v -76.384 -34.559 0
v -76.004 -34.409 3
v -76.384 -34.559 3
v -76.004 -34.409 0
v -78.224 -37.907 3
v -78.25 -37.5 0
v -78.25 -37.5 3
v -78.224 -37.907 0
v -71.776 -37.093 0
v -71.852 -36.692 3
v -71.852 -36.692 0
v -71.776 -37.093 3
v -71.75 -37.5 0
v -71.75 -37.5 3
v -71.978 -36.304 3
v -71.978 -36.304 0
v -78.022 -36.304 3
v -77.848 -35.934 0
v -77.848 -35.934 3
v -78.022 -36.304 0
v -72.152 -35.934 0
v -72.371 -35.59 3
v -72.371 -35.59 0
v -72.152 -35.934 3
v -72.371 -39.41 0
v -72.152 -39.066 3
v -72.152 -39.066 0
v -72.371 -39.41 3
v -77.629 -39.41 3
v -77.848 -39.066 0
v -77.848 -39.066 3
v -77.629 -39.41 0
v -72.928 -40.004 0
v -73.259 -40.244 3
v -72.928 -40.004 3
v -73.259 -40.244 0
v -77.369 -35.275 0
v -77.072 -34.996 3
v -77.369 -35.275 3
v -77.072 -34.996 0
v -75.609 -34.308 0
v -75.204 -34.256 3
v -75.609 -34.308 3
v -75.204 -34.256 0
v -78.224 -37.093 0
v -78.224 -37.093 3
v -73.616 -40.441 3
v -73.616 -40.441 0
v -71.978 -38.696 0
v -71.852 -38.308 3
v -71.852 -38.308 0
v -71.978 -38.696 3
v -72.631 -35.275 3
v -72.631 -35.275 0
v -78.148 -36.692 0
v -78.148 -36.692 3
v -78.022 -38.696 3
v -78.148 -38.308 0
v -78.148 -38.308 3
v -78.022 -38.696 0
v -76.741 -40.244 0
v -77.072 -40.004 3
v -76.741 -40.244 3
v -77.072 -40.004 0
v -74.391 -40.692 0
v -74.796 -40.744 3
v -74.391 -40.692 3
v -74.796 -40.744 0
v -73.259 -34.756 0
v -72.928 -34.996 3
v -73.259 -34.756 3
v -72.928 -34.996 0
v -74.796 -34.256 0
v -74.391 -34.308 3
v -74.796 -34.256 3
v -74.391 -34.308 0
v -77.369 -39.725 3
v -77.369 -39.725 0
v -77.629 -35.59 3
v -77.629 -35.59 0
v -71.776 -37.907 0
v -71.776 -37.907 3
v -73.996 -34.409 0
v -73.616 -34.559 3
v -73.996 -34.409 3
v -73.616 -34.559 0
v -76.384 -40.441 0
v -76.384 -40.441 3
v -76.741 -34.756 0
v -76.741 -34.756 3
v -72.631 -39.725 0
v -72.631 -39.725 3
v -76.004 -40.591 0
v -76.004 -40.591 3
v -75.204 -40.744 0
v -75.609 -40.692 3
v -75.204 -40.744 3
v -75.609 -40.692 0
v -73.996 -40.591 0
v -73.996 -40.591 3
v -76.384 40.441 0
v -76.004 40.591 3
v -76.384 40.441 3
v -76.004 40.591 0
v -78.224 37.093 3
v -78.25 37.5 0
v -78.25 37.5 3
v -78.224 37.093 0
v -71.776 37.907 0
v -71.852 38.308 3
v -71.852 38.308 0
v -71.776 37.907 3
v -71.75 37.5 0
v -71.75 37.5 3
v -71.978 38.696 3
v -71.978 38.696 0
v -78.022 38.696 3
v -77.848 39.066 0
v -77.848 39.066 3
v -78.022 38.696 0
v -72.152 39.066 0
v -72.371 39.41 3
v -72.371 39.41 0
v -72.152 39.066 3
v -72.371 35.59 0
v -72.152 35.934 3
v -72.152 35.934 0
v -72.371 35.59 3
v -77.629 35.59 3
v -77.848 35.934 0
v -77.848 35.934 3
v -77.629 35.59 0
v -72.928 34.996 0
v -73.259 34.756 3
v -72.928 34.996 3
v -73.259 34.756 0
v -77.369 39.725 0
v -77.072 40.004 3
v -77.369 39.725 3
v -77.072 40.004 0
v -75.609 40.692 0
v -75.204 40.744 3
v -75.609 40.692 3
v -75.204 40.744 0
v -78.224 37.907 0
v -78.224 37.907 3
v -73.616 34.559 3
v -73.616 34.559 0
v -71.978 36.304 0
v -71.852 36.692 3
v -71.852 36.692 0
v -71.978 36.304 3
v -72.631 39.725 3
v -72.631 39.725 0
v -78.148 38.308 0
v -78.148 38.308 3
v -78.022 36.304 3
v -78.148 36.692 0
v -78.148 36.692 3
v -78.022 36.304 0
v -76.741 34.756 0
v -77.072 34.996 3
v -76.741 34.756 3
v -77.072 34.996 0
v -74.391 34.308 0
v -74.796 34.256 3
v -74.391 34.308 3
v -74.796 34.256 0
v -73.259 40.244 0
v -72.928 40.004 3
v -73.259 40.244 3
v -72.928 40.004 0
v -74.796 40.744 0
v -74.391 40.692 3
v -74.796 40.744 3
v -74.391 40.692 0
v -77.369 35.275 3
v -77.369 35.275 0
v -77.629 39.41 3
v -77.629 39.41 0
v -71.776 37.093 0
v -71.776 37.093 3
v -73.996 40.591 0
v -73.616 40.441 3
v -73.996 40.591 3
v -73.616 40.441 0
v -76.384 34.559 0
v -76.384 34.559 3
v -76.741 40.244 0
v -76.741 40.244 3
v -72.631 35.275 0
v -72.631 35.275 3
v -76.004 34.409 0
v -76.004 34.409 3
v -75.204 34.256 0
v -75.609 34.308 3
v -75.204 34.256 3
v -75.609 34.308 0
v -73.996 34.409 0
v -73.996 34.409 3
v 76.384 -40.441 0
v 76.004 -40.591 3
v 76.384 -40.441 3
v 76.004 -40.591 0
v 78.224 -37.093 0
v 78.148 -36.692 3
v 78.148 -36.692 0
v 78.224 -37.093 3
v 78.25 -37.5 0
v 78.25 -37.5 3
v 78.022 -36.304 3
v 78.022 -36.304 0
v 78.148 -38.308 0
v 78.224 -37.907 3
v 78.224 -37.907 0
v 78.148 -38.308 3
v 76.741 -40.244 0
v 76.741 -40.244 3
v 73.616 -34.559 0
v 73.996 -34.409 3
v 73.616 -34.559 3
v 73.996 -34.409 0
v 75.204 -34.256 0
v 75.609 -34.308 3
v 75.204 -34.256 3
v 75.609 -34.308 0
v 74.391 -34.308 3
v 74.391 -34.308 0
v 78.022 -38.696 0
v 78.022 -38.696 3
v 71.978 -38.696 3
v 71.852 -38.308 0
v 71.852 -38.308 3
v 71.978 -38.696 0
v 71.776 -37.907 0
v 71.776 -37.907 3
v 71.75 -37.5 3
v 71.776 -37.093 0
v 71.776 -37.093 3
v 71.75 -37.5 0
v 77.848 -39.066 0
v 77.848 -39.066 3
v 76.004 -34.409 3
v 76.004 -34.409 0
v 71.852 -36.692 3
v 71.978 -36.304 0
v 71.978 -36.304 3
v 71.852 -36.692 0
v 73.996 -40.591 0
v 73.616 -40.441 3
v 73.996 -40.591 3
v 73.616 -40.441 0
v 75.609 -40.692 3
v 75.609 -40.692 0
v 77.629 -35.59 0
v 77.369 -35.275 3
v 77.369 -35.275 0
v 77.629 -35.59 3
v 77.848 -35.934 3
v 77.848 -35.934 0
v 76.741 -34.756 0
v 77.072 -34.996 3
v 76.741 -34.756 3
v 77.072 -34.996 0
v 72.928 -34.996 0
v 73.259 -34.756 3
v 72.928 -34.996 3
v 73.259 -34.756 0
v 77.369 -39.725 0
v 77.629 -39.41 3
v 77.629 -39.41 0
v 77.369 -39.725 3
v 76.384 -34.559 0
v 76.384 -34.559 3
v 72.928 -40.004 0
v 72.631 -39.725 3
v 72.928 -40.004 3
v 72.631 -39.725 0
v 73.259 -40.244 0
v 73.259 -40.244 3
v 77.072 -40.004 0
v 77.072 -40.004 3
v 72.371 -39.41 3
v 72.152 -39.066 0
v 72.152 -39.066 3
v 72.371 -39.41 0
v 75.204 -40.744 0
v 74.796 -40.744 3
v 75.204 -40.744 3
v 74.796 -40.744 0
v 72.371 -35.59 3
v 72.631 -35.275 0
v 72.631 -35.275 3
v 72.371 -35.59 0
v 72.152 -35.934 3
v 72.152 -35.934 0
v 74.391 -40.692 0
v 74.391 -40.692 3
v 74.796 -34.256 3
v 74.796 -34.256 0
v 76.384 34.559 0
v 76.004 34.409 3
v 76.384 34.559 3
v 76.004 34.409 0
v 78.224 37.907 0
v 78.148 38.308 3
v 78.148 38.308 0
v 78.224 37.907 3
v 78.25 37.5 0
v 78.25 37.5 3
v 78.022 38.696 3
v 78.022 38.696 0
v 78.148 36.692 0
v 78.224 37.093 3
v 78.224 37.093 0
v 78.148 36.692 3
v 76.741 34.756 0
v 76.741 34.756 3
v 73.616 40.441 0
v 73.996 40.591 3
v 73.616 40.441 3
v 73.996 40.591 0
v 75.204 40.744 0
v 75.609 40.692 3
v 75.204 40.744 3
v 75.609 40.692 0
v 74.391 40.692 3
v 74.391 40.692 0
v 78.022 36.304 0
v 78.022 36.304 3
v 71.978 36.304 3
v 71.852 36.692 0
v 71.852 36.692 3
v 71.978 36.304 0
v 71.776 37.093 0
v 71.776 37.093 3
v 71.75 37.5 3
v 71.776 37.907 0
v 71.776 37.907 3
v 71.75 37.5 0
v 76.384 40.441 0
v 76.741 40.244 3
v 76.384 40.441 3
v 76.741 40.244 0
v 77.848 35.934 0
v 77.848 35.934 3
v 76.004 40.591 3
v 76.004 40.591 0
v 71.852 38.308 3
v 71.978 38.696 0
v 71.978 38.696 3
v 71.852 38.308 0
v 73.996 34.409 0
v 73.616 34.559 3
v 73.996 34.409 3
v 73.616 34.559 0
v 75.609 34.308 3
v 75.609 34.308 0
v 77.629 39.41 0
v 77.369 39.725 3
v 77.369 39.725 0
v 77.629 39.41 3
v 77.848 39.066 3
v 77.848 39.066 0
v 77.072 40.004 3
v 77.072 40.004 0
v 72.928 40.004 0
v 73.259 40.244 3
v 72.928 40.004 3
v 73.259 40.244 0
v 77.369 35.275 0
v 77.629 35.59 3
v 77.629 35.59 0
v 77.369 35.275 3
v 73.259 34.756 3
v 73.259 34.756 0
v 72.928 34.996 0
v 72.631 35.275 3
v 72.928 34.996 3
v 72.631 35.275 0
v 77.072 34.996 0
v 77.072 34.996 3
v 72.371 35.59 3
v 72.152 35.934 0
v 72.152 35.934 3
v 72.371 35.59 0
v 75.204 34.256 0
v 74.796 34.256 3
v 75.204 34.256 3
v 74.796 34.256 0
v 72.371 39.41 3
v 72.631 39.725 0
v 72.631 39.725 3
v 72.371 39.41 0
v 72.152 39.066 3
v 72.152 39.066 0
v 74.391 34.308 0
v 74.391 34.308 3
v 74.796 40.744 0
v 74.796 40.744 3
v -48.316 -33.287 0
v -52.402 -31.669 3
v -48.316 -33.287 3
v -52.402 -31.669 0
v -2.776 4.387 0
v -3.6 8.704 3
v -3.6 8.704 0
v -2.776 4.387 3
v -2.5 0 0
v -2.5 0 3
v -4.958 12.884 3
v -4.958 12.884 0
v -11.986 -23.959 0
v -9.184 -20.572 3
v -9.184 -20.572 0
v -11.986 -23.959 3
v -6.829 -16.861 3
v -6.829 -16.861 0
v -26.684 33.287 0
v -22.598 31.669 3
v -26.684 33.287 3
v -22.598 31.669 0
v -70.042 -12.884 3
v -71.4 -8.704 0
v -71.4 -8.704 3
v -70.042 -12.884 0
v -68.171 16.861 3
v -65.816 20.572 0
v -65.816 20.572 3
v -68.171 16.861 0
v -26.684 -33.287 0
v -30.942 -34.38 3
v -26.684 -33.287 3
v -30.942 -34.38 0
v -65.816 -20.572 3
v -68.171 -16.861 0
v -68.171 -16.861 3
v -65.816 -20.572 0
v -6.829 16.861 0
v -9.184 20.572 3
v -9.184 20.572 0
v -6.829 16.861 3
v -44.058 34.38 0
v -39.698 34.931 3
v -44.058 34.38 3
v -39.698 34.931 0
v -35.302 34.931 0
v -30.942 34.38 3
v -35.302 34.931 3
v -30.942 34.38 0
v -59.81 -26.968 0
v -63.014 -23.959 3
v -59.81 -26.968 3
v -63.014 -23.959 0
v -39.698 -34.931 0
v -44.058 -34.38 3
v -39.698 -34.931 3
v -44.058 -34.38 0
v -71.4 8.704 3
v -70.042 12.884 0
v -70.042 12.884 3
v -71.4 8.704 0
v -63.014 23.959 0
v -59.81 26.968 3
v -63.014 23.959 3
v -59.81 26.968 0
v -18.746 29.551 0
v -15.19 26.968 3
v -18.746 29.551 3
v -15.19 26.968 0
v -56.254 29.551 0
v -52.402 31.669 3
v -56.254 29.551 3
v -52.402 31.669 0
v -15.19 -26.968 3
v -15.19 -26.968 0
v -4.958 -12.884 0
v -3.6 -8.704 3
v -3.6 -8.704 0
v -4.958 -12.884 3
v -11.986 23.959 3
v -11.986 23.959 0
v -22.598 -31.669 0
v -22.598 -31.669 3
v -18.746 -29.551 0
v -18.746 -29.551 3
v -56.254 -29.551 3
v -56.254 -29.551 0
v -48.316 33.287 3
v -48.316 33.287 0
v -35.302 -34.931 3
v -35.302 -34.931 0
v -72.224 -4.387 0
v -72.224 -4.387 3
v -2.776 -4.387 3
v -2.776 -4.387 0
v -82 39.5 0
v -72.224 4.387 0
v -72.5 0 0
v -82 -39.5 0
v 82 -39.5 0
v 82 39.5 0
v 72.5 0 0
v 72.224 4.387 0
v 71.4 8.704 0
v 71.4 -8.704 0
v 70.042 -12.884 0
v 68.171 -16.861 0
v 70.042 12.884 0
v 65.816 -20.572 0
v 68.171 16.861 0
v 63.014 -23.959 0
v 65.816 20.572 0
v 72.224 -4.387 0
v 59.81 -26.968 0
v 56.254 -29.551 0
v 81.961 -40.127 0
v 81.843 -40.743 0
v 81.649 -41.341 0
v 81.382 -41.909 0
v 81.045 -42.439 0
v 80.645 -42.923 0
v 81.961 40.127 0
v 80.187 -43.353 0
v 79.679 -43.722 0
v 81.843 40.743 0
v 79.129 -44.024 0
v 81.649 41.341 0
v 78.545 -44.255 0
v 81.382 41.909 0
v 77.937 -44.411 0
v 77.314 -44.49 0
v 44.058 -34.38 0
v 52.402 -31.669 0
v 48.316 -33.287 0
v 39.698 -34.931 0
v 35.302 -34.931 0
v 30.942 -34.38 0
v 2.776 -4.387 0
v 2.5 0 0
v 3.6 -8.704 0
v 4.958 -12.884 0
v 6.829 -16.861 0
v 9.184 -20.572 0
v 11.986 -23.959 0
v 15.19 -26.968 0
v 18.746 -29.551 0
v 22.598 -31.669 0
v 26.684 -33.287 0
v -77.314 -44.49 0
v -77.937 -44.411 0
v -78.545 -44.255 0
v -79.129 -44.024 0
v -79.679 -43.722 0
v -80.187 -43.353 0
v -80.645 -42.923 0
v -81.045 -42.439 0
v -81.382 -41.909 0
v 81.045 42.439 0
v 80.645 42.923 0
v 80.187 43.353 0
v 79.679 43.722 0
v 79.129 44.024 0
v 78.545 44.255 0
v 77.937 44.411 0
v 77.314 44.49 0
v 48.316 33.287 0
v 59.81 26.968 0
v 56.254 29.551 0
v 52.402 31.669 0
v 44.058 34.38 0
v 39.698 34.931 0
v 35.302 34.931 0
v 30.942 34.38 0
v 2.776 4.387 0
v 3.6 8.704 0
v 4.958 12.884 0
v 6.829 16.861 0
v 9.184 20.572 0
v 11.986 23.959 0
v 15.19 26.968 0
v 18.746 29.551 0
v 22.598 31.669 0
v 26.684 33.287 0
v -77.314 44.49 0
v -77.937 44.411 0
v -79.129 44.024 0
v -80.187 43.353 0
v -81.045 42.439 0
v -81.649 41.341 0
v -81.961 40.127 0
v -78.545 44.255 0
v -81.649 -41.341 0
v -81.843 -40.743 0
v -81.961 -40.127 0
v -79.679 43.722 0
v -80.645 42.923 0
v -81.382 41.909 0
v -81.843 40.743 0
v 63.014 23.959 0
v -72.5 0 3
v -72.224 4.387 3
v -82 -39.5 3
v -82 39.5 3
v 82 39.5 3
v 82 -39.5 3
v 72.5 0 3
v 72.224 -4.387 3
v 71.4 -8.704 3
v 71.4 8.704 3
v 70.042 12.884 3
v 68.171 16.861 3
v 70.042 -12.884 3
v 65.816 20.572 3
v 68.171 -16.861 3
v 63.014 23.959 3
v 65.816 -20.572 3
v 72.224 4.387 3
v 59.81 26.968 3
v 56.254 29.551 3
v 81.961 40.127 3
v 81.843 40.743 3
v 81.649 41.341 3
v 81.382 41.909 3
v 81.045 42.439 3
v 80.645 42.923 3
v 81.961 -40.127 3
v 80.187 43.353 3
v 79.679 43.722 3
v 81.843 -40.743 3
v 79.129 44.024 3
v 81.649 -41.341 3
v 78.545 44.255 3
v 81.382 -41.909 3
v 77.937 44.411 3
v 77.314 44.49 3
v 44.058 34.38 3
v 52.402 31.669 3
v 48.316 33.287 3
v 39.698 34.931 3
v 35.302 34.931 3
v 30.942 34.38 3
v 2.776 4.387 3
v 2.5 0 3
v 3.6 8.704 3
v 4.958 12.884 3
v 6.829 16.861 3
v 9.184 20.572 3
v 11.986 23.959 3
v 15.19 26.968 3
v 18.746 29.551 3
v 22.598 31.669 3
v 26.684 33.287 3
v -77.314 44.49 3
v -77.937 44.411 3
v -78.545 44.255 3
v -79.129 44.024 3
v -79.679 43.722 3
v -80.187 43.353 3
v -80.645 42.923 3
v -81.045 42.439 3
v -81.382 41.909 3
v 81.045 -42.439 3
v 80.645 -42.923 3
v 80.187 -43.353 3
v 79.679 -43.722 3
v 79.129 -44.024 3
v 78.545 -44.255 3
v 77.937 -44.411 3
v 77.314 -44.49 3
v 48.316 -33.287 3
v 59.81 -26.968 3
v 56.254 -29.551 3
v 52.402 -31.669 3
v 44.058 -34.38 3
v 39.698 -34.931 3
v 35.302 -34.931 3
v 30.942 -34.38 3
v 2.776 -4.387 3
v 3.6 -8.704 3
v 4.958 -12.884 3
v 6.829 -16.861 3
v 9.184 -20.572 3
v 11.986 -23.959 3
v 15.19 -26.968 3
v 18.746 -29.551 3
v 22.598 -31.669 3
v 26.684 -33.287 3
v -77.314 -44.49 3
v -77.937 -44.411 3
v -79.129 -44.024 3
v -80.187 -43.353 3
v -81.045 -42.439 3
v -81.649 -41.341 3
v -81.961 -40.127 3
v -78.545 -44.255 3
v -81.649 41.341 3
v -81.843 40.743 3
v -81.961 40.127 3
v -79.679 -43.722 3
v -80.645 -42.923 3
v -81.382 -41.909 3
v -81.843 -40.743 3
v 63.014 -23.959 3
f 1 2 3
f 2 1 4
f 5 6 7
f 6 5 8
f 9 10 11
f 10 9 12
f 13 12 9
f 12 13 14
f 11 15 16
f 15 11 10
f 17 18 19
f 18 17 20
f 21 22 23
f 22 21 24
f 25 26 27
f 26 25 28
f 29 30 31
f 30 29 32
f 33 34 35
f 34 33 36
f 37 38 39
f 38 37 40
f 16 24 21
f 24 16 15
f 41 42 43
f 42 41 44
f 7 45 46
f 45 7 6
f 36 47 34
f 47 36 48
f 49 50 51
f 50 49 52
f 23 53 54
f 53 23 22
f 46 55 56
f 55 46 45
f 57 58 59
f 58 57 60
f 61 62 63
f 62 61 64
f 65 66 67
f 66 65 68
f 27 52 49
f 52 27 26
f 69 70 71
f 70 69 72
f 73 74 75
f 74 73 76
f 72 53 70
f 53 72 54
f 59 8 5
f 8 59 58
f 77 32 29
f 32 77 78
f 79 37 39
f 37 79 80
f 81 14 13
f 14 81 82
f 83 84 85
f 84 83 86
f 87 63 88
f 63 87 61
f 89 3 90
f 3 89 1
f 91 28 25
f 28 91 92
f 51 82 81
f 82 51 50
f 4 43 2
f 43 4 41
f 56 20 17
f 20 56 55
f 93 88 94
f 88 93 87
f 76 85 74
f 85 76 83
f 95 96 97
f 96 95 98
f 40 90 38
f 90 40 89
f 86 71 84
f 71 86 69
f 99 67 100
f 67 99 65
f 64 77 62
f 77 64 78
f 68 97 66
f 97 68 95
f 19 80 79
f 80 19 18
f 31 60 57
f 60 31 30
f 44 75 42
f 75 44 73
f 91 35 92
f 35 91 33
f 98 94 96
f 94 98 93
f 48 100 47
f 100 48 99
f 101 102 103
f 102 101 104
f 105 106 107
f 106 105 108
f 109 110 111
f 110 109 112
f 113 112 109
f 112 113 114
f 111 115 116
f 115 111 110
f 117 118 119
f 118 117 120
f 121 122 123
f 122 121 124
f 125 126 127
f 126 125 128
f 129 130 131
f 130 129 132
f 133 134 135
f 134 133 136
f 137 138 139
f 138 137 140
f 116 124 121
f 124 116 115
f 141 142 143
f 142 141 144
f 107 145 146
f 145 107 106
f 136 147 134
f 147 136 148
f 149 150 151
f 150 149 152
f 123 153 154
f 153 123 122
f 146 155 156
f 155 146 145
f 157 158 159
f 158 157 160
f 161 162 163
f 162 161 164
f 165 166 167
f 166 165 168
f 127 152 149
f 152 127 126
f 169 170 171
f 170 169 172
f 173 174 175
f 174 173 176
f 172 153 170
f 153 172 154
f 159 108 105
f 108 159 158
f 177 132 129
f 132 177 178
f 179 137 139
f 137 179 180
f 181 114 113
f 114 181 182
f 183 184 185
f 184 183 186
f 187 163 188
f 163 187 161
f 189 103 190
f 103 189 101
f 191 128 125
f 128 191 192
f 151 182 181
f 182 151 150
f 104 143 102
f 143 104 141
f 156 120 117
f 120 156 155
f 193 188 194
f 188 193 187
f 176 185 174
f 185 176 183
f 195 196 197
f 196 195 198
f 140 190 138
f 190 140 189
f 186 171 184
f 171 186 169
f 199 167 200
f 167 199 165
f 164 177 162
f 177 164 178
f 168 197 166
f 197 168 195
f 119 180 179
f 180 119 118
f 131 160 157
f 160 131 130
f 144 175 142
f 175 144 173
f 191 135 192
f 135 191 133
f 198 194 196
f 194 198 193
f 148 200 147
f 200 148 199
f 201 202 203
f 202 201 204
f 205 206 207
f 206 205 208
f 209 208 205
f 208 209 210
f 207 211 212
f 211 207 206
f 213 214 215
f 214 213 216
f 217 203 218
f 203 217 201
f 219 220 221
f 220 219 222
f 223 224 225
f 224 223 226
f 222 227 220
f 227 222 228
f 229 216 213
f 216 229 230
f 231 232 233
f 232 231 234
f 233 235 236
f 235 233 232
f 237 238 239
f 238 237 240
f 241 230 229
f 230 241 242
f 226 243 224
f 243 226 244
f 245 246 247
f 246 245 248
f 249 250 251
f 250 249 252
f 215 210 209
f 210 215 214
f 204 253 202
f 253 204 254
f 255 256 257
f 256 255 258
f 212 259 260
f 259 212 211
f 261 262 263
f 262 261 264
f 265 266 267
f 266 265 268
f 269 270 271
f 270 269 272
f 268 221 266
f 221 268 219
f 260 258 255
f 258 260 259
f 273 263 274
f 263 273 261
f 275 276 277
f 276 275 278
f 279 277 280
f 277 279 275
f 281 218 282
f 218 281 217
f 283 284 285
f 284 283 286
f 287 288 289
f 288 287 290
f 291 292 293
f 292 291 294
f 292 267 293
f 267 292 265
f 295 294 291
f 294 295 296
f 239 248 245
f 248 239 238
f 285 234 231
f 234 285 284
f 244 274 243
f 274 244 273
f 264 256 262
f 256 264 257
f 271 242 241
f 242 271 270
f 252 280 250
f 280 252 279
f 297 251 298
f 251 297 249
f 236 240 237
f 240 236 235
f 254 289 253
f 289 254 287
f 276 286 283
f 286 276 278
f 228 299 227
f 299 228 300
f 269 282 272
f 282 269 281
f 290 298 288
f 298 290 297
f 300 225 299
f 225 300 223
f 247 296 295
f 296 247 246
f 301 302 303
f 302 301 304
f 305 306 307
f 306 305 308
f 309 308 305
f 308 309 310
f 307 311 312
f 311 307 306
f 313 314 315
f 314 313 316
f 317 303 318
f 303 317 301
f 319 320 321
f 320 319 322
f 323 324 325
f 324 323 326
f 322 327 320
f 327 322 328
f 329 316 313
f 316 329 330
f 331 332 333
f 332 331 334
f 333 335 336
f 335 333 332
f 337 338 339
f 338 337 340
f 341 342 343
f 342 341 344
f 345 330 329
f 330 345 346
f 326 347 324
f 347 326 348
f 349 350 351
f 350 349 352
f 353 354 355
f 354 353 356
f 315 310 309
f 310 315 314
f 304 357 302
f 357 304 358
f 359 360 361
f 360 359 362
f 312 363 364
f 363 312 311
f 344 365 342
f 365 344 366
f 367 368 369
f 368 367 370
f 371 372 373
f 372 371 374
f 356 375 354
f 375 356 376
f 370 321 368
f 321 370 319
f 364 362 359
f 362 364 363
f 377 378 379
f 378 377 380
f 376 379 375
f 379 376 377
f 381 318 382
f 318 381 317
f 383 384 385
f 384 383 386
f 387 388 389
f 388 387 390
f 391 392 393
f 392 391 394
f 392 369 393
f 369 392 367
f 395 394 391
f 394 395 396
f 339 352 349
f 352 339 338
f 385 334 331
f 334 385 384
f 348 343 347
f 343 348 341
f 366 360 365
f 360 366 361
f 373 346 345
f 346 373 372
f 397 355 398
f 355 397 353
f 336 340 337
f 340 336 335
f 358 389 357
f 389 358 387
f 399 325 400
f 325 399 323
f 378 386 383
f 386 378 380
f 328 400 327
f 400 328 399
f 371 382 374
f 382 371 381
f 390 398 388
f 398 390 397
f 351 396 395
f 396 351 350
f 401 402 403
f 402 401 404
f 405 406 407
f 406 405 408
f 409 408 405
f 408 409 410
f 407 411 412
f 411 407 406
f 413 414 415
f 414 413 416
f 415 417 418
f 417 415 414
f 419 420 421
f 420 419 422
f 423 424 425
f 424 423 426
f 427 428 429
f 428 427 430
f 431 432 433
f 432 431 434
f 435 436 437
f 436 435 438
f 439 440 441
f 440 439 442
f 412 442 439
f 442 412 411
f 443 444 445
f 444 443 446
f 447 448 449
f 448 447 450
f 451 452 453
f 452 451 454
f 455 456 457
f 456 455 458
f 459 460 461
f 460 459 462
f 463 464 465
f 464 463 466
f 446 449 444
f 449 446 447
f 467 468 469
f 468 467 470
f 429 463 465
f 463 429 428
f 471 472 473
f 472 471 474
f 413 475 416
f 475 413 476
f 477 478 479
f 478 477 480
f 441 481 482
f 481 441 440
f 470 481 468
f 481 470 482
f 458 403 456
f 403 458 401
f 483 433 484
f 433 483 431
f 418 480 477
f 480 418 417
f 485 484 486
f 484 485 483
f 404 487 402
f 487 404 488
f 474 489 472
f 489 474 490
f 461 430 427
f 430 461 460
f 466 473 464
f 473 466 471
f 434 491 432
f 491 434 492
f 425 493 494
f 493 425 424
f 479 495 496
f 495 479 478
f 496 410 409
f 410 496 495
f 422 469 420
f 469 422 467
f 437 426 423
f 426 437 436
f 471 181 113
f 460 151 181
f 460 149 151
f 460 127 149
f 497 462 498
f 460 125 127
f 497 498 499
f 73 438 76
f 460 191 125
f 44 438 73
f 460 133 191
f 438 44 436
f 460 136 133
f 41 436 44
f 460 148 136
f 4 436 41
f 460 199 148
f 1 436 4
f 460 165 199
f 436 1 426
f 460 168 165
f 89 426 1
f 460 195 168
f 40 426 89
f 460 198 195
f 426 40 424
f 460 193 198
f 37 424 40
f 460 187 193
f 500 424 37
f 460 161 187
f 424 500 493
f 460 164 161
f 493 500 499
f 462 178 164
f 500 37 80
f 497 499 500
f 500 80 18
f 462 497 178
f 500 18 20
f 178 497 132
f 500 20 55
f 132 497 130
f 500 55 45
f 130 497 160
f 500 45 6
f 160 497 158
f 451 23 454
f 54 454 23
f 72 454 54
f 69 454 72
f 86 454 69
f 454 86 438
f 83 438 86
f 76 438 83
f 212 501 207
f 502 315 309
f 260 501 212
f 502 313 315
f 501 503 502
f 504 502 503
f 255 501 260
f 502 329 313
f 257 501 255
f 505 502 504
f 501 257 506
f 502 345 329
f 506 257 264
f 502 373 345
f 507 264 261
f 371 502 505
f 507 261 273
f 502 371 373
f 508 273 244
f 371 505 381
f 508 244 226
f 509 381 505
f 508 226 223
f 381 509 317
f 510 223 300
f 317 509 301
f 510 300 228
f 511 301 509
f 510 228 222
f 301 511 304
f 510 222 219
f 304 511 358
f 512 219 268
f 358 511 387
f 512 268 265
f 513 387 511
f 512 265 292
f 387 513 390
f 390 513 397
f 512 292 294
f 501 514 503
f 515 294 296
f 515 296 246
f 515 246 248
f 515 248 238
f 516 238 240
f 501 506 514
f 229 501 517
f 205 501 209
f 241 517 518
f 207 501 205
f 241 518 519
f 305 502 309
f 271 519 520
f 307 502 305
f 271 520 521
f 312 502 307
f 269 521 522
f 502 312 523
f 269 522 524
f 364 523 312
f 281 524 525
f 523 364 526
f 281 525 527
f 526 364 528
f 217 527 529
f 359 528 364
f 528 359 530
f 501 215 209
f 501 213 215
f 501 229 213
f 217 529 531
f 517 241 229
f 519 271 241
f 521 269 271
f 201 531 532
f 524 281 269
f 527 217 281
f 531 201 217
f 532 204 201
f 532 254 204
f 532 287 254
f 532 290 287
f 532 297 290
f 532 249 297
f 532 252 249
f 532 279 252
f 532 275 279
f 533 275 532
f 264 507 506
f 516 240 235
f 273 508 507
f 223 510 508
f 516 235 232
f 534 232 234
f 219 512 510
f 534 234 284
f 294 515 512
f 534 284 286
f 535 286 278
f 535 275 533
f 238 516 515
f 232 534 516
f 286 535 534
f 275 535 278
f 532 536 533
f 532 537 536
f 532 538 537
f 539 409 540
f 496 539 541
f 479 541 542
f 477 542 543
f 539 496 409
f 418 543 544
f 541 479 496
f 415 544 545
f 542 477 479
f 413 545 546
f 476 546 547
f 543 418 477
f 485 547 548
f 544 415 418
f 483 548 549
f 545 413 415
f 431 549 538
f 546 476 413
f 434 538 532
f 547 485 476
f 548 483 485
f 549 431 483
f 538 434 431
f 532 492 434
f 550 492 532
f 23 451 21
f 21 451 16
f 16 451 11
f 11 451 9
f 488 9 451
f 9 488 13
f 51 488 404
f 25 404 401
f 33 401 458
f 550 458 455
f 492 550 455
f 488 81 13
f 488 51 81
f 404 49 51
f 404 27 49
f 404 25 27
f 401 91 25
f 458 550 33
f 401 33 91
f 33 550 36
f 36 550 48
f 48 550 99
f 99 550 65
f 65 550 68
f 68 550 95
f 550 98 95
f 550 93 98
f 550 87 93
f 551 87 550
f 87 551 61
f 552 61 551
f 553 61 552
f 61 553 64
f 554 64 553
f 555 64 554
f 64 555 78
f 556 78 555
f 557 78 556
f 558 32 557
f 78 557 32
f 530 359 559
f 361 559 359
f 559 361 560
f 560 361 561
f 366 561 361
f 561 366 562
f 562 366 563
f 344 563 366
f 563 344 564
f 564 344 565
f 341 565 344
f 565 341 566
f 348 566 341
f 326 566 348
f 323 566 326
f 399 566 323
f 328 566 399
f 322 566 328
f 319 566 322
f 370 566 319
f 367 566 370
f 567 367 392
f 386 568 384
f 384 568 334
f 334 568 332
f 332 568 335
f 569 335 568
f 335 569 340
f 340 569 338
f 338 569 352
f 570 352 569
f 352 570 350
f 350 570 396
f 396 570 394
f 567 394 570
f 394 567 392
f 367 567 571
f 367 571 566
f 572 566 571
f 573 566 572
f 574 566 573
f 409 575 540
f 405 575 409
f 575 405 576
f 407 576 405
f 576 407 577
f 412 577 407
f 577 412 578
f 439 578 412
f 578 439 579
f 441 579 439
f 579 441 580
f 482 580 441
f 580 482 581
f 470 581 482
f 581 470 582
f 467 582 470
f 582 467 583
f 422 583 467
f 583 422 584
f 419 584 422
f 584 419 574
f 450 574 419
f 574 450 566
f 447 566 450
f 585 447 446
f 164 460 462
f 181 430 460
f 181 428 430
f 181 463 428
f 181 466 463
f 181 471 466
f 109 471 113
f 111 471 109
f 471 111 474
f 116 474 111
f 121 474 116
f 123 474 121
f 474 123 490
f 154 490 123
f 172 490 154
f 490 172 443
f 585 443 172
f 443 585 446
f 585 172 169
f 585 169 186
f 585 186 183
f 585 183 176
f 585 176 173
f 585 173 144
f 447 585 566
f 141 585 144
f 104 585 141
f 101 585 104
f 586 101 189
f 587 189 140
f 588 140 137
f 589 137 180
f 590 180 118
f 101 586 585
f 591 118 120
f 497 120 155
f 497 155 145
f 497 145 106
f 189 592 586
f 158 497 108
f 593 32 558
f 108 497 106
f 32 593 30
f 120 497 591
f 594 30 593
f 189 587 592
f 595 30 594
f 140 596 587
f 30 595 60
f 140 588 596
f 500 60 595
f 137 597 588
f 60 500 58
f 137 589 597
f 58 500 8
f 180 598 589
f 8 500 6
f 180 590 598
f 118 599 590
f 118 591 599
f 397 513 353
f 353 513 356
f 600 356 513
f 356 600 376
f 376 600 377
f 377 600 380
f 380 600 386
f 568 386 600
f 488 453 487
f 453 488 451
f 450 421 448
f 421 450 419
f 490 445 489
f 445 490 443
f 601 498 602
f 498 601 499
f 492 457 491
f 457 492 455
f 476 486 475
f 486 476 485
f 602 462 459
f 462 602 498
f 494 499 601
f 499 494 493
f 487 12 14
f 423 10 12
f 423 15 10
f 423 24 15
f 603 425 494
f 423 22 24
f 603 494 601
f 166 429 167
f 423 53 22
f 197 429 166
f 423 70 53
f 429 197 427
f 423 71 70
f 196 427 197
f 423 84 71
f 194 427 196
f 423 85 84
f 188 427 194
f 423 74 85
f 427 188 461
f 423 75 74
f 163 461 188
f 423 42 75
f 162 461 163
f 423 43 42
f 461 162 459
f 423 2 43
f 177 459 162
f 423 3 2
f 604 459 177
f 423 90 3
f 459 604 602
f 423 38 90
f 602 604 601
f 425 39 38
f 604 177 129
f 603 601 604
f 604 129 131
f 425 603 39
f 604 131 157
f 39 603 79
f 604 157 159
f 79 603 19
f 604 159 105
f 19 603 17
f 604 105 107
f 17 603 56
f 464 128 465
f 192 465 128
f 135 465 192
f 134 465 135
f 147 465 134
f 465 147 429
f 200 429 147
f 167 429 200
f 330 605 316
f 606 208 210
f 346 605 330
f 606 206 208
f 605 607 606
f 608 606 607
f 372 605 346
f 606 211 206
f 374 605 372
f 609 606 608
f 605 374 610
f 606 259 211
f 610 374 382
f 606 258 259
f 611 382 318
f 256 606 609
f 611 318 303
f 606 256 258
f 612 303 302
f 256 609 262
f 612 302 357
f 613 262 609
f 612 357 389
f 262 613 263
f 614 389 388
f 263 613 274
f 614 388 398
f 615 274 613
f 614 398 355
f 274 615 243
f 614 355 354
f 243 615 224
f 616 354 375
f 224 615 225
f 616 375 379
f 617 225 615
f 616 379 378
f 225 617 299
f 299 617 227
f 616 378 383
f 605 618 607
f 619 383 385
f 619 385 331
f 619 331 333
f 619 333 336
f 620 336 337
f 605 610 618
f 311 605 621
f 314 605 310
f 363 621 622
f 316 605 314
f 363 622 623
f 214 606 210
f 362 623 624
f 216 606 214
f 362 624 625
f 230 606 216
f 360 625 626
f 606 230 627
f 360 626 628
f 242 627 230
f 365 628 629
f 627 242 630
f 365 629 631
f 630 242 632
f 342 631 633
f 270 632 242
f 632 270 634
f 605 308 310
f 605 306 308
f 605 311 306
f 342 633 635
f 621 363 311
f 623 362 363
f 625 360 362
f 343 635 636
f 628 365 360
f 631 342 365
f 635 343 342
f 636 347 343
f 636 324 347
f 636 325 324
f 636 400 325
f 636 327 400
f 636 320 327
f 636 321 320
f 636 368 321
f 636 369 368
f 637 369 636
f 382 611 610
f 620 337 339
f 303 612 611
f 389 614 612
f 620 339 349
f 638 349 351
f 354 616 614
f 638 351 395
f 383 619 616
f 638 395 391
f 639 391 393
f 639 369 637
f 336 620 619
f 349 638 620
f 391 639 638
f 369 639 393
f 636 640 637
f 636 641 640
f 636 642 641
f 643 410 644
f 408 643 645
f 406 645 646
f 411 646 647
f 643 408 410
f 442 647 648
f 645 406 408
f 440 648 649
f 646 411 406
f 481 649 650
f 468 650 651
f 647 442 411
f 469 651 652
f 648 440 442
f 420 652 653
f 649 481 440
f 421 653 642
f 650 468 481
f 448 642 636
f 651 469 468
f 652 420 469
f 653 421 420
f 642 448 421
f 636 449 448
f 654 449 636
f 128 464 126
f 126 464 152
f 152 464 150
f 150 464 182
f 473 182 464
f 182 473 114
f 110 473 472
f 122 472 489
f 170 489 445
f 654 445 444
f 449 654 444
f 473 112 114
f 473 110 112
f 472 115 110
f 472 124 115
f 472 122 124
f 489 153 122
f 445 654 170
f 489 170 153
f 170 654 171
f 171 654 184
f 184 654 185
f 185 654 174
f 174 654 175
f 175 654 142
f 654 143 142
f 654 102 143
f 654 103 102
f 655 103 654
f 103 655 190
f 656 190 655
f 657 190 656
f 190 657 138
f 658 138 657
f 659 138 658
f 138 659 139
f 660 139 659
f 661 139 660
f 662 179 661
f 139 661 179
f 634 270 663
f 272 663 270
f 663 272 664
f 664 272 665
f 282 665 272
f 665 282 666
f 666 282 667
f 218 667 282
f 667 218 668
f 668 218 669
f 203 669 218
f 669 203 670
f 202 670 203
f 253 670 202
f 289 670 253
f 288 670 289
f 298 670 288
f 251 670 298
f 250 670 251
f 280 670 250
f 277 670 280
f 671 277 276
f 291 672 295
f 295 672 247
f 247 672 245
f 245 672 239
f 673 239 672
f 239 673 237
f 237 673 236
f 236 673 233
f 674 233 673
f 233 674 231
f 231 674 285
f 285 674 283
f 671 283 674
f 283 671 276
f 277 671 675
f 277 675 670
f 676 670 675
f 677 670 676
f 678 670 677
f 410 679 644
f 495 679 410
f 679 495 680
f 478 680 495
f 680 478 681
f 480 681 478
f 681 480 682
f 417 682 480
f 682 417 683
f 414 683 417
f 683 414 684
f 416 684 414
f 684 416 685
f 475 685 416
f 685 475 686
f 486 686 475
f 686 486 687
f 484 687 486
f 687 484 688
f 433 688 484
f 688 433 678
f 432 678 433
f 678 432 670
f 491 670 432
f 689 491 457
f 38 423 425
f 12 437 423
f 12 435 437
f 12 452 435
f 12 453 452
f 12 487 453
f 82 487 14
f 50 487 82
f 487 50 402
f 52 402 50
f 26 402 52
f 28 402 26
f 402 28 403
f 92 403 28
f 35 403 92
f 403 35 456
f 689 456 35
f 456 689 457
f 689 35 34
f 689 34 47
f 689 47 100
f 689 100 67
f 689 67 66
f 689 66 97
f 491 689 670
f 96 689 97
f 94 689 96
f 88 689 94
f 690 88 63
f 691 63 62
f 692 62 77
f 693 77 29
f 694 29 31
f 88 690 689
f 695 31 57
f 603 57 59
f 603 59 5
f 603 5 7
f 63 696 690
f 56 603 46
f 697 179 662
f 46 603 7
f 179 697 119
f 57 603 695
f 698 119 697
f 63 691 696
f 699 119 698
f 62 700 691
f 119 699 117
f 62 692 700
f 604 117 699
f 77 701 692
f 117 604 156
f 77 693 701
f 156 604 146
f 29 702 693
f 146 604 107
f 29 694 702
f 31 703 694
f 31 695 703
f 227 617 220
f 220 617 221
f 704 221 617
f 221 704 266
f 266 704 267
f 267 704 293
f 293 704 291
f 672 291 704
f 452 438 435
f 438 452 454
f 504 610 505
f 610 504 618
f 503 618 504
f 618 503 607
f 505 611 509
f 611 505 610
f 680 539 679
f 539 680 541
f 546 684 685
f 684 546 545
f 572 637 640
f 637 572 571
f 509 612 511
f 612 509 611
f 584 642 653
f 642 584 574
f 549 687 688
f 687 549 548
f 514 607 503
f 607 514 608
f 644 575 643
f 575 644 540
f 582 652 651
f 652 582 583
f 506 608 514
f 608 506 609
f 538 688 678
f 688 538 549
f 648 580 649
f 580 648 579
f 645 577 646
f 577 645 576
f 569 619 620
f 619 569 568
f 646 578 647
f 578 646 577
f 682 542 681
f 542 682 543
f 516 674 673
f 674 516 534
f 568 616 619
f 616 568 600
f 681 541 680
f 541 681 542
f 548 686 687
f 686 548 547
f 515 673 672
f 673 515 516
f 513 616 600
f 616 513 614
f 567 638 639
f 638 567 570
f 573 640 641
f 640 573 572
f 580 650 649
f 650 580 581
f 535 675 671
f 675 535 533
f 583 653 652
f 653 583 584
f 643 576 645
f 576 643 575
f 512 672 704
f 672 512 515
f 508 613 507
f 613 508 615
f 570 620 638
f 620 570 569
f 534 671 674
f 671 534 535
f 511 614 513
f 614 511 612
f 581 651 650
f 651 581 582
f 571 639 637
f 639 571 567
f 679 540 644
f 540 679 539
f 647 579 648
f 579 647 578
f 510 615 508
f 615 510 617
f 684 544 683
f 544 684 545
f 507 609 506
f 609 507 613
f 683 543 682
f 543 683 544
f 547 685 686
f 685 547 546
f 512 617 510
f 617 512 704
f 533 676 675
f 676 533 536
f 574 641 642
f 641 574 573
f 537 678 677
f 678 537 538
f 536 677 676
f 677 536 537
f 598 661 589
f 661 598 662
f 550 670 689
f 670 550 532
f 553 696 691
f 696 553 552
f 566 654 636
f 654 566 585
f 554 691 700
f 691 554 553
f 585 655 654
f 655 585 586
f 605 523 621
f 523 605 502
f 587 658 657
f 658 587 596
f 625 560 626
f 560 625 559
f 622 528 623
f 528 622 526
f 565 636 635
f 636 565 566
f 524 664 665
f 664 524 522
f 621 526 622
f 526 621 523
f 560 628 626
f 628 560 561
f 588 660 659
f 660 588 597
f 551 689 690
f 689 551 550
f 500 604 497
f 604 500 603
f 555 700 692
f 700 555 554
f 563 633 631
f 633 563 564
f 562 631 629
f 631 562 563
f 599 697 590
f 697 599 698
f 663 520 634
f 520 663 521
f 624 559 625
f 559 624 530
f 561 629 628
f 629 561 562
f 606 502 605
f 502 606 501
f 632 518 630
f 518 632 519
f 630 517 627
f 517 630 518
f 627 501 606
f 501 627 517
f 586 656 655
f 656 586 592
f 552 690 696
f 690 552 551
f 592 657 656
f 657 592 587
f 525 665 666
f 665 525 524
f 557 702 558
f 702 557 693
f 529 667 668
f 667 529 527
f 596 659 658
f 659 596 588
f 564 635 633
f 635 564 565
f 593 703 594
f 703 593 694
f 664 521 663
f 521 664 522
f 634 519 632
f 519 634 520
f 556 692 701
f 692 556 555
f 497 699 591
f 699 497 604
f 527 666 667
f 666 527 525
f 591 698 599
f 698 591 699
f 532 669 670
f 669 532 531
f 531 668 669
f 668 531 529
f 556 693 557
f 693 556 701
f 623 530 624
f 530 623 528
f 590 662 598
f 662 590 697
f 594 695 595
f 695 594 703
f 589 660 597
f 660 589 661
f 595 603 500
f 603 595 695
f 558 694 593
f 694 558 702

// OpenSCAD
$fn = 50;


difference() {
	union() {
		hull() {
			translate(v = [-77.0000000000, 39.5000000000, 0]) {
				cylinder(h = 3, r = 5);
			}
			translate(v = [77.0000000000, 39.5000000000, 0]) {
				cylinder(h = 3, r = 5);
			}
			translate(v = [-77.0000000000, -39.5000000000, 0]) {
				cylinder(h = 3, r = 5);
			}
			translate(v = [77.0000000000, -39.5000000000, 0]) {
				cylinder(h = 3, r = 5);
			}
		}
	}
	union() {
		#translate(v = [-75.0000000000, -37.5000000000, -100.0000000000]) {
			cylinder(h = 200, r = 3.2500000000);
		}
		#translate(v = [-75.0000000000, 37.5000000000, -100.0000000000]) {
			cylinder(h = 200, r = 3.2500000000);
		}
		#translate(v = [75.0000000000, -37.5000000000, -100.0000000000]) {
			cylinder(h = 200, r = 3.2500000000);
		}
		#translate(v = [75.0000000000, 37.5000000000, -100.0000000000]) {
			cylinder(h = 200, r = 3.2500000000);
		}
		#translate(v = [-37.5000000000, 0, 0]) {
			cylinder(h = 3, r = 35.0000000000);
		}
		#translate(v = [37.5000000000, 0, 0]) {
			cylinder(h = 3, r = 35.0000000000);
		}
	}
}
